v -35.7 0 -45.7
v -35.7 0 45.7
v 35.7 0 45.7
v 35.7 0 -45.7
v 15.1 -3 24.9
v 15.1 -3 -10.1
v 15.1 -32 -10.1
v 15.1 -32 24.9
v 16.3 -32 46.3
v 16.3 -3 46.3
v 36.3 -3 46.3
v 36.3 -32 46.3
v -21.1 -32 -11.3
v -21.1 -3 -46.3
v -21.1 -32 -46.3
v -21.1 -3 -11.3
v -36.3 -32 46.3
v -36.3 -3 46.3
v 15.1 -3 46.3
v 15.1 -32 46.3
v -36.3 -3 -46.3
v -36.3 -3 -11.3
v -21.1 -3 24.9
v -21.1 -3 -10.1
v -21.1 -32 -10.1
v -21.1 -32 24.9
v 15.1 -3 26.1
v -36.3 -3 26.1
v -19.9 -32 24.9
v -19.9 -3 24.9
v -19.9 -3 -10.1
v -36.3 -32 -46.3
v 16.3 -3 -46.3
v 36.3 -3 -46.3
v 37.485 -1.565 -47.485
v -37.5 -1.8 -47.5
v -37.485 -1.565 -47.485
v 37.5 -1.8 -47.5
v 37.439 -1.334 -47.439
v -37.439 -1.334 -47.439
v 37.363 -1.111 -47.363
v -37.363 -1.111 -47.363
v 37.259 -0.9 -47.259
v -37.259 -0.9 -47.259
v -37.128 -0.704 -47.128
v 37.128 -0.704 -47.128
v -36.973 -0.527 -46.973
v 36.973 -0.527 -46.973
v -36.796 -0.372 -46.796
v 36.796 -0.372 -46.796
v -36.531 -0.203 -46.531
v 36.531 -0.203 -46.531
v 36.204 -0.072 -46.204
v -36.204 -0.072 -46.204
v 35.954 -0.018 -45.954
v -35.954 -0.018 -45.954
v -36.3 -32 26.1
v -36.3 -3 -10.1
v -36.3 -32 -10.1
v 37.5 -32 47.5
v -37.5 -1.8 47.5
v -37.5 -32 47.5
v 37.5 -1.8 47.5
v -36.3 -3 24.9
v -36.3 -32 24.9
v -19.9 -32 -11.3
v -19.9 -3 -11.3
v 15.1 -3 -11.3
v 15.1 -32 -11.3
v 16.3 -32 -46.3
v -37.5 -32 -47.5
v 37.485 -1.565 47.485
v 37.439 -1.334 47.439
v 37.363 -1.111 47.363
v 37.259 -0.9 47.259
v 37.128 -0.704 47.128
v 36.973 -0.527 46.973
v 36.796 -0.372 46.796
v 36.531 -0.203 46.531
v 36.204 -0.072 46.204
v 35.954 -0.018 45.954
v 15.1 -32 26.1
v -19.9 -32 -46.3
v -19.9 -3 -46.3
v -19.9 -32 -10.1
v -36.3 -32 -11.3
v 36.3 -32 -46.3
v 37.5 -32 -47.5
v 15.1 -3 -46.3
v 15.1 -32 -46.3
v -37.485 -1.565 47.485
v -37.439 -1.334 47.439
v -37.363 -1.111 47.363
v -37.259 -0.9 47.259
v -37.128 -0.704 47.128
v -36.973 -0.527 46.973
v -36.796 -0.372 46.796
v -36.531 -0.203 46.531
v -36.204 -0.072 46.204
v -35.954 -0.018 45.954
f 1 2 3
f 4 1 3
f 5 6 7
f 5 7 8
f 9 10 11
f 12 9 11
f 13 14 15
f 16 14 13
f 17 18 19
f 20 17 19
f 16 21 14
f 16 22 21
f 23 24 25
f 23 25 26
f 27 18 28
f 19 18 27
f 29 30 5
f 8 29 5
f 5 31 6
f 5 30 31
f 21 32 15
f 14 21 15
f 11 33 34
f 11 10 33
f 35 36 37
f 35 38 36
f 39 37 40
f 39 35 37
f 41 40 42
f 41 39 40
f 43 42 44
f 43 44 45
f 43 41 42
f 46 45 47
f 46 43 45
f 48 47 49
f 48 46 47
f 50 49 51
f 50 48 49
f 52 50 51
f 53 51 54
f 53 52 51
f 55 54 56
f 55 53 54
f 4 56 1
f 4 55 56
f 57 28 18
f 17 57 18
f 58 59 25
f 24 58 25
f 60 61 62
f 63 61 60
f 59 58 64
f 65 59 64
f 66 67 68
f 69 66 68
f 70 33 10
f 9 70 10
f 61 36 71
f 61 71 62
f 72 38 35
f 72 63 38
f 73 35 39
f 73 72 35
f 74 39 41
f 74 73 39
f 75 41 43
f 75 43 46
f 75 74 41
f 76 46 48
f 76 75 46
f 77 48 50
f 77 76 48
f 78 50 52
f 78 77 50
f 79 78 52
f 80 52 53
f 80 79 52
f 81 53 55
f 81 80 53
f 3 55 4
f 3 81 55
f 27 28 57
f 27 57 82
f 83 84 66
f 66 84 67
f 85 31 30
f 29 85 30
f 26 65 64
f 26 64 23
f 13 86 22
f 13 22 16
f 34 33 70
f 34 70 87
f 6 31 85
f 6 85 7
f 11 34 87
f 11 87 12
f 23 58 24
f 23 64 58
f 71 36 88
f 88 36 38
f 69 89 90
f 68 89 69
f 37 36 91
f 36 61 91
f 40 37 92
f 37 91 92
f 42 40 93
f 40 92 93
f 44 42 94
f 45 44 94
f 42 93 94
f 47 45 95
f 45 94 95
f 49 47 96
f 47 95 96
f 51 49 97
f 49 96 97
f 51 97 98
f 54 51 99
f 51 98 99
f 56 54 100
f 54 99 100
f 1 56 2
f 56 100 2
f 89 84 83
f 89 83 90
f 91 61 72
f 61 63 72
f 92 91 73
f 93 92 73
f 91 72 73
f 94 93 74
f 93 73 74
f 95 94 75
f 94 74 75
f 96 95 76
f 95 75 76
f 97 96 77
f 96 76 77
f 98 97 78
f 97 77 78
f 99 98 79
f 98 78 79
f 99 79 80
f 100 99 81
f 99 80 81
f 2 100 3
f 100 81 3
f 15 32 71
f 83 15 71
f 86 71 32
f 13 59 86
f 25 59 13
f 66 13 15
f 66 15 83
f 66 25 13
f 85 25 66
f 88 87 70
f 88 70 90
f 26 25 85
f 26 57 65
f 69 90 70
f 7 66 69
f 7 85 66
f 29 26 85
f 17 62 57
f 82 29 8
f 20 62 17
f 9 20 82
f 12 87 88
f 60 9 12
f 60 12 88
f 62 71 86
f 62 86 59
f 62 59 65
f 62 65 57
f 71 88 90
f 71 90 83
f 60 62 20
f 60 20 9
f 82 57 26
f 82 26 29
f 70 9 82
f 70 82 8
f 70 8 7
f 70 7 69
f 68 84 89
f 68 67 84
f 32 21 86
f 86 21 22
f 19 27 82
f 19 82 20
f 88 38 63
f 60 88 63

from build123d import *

# Parameters (mm, degrees)
SKETCH009_W   = 75
SKETCH009_H   = 95
PAD005_DEPTH  = 3
SKETCH010_W   = 75
SKETCH010_H   = 95
SKETCH010_W_2 = 51.4
SKETCH010_H_2 = 20.2
SKETCH010_W_3 = 20
SKETCH010_H_3 = 92.6
SKETCH010_W_4 = 15.2
SKETCH010_H_4 = 35
SKETCH010_W_5 = 35
PAD006_DEPTH  = 30
FILLET003_R   = 1.8


with BuildPart() as part:
    # Sketch009 → Pad005 (new body)
    with BuildSketch(Plane.XZ):
        Rectangle(SKETCH009_W, SKETCH009_H)
    extrude(amount=PAD005_DEPTH)

    # Sketch010 → Pad006 (join)
    with BuildSketch(Plane.XZ.offset(2)):
        Rectangle(SKETCH010_W, SKETCH010_H)
        with Locations((-10.6, 36.2)):
            Rectangle(SKETCH010_W_2, SKETCH010_H_2, mode=Mode.SUBTRACT)
        with Locations((26.3, 0)):
            Rectangle(SKETCH010_W_3, SKETCH010_H_3, mode=Mode.SUBTRACT)
        with Locations((-28.7, 7.4)):
            Rectangle(SKETCH010_W_4, SKETCH010_H_4, mode=Mode.SUBTRACT)
        with Locations((-28.7, -28.8)):
            Rectangle(SKETCH010_W_4, SKETCH010_H_4, mode=Mode.SUBTRACT)
        with Locations((-2.4, 7.4)):
            Rectangle(SKETCH010_W_5, SKETCH010_H_4, mode=Mode.SUBTRACT)
        with Locations((-2.4, -28.8)):
            Rectangle(SKETCH010_W_5, SKETCH010_H_4, mode=Mode.SUBTRACT)
    extrude(amount=PAD006_DEPTH)

    # Fillet003
    fillet003_edges = [part.edges().sort_by_distance(p)[0] for p in [
        (0, 0, 47.5),
        (37.5, 0, 0),
        (0, 0, -47.5),
        (-37.5, 0, 0),
    ]]
    fillet(fillet003_edges, radius=FILLET003_R)


solid = part.part
